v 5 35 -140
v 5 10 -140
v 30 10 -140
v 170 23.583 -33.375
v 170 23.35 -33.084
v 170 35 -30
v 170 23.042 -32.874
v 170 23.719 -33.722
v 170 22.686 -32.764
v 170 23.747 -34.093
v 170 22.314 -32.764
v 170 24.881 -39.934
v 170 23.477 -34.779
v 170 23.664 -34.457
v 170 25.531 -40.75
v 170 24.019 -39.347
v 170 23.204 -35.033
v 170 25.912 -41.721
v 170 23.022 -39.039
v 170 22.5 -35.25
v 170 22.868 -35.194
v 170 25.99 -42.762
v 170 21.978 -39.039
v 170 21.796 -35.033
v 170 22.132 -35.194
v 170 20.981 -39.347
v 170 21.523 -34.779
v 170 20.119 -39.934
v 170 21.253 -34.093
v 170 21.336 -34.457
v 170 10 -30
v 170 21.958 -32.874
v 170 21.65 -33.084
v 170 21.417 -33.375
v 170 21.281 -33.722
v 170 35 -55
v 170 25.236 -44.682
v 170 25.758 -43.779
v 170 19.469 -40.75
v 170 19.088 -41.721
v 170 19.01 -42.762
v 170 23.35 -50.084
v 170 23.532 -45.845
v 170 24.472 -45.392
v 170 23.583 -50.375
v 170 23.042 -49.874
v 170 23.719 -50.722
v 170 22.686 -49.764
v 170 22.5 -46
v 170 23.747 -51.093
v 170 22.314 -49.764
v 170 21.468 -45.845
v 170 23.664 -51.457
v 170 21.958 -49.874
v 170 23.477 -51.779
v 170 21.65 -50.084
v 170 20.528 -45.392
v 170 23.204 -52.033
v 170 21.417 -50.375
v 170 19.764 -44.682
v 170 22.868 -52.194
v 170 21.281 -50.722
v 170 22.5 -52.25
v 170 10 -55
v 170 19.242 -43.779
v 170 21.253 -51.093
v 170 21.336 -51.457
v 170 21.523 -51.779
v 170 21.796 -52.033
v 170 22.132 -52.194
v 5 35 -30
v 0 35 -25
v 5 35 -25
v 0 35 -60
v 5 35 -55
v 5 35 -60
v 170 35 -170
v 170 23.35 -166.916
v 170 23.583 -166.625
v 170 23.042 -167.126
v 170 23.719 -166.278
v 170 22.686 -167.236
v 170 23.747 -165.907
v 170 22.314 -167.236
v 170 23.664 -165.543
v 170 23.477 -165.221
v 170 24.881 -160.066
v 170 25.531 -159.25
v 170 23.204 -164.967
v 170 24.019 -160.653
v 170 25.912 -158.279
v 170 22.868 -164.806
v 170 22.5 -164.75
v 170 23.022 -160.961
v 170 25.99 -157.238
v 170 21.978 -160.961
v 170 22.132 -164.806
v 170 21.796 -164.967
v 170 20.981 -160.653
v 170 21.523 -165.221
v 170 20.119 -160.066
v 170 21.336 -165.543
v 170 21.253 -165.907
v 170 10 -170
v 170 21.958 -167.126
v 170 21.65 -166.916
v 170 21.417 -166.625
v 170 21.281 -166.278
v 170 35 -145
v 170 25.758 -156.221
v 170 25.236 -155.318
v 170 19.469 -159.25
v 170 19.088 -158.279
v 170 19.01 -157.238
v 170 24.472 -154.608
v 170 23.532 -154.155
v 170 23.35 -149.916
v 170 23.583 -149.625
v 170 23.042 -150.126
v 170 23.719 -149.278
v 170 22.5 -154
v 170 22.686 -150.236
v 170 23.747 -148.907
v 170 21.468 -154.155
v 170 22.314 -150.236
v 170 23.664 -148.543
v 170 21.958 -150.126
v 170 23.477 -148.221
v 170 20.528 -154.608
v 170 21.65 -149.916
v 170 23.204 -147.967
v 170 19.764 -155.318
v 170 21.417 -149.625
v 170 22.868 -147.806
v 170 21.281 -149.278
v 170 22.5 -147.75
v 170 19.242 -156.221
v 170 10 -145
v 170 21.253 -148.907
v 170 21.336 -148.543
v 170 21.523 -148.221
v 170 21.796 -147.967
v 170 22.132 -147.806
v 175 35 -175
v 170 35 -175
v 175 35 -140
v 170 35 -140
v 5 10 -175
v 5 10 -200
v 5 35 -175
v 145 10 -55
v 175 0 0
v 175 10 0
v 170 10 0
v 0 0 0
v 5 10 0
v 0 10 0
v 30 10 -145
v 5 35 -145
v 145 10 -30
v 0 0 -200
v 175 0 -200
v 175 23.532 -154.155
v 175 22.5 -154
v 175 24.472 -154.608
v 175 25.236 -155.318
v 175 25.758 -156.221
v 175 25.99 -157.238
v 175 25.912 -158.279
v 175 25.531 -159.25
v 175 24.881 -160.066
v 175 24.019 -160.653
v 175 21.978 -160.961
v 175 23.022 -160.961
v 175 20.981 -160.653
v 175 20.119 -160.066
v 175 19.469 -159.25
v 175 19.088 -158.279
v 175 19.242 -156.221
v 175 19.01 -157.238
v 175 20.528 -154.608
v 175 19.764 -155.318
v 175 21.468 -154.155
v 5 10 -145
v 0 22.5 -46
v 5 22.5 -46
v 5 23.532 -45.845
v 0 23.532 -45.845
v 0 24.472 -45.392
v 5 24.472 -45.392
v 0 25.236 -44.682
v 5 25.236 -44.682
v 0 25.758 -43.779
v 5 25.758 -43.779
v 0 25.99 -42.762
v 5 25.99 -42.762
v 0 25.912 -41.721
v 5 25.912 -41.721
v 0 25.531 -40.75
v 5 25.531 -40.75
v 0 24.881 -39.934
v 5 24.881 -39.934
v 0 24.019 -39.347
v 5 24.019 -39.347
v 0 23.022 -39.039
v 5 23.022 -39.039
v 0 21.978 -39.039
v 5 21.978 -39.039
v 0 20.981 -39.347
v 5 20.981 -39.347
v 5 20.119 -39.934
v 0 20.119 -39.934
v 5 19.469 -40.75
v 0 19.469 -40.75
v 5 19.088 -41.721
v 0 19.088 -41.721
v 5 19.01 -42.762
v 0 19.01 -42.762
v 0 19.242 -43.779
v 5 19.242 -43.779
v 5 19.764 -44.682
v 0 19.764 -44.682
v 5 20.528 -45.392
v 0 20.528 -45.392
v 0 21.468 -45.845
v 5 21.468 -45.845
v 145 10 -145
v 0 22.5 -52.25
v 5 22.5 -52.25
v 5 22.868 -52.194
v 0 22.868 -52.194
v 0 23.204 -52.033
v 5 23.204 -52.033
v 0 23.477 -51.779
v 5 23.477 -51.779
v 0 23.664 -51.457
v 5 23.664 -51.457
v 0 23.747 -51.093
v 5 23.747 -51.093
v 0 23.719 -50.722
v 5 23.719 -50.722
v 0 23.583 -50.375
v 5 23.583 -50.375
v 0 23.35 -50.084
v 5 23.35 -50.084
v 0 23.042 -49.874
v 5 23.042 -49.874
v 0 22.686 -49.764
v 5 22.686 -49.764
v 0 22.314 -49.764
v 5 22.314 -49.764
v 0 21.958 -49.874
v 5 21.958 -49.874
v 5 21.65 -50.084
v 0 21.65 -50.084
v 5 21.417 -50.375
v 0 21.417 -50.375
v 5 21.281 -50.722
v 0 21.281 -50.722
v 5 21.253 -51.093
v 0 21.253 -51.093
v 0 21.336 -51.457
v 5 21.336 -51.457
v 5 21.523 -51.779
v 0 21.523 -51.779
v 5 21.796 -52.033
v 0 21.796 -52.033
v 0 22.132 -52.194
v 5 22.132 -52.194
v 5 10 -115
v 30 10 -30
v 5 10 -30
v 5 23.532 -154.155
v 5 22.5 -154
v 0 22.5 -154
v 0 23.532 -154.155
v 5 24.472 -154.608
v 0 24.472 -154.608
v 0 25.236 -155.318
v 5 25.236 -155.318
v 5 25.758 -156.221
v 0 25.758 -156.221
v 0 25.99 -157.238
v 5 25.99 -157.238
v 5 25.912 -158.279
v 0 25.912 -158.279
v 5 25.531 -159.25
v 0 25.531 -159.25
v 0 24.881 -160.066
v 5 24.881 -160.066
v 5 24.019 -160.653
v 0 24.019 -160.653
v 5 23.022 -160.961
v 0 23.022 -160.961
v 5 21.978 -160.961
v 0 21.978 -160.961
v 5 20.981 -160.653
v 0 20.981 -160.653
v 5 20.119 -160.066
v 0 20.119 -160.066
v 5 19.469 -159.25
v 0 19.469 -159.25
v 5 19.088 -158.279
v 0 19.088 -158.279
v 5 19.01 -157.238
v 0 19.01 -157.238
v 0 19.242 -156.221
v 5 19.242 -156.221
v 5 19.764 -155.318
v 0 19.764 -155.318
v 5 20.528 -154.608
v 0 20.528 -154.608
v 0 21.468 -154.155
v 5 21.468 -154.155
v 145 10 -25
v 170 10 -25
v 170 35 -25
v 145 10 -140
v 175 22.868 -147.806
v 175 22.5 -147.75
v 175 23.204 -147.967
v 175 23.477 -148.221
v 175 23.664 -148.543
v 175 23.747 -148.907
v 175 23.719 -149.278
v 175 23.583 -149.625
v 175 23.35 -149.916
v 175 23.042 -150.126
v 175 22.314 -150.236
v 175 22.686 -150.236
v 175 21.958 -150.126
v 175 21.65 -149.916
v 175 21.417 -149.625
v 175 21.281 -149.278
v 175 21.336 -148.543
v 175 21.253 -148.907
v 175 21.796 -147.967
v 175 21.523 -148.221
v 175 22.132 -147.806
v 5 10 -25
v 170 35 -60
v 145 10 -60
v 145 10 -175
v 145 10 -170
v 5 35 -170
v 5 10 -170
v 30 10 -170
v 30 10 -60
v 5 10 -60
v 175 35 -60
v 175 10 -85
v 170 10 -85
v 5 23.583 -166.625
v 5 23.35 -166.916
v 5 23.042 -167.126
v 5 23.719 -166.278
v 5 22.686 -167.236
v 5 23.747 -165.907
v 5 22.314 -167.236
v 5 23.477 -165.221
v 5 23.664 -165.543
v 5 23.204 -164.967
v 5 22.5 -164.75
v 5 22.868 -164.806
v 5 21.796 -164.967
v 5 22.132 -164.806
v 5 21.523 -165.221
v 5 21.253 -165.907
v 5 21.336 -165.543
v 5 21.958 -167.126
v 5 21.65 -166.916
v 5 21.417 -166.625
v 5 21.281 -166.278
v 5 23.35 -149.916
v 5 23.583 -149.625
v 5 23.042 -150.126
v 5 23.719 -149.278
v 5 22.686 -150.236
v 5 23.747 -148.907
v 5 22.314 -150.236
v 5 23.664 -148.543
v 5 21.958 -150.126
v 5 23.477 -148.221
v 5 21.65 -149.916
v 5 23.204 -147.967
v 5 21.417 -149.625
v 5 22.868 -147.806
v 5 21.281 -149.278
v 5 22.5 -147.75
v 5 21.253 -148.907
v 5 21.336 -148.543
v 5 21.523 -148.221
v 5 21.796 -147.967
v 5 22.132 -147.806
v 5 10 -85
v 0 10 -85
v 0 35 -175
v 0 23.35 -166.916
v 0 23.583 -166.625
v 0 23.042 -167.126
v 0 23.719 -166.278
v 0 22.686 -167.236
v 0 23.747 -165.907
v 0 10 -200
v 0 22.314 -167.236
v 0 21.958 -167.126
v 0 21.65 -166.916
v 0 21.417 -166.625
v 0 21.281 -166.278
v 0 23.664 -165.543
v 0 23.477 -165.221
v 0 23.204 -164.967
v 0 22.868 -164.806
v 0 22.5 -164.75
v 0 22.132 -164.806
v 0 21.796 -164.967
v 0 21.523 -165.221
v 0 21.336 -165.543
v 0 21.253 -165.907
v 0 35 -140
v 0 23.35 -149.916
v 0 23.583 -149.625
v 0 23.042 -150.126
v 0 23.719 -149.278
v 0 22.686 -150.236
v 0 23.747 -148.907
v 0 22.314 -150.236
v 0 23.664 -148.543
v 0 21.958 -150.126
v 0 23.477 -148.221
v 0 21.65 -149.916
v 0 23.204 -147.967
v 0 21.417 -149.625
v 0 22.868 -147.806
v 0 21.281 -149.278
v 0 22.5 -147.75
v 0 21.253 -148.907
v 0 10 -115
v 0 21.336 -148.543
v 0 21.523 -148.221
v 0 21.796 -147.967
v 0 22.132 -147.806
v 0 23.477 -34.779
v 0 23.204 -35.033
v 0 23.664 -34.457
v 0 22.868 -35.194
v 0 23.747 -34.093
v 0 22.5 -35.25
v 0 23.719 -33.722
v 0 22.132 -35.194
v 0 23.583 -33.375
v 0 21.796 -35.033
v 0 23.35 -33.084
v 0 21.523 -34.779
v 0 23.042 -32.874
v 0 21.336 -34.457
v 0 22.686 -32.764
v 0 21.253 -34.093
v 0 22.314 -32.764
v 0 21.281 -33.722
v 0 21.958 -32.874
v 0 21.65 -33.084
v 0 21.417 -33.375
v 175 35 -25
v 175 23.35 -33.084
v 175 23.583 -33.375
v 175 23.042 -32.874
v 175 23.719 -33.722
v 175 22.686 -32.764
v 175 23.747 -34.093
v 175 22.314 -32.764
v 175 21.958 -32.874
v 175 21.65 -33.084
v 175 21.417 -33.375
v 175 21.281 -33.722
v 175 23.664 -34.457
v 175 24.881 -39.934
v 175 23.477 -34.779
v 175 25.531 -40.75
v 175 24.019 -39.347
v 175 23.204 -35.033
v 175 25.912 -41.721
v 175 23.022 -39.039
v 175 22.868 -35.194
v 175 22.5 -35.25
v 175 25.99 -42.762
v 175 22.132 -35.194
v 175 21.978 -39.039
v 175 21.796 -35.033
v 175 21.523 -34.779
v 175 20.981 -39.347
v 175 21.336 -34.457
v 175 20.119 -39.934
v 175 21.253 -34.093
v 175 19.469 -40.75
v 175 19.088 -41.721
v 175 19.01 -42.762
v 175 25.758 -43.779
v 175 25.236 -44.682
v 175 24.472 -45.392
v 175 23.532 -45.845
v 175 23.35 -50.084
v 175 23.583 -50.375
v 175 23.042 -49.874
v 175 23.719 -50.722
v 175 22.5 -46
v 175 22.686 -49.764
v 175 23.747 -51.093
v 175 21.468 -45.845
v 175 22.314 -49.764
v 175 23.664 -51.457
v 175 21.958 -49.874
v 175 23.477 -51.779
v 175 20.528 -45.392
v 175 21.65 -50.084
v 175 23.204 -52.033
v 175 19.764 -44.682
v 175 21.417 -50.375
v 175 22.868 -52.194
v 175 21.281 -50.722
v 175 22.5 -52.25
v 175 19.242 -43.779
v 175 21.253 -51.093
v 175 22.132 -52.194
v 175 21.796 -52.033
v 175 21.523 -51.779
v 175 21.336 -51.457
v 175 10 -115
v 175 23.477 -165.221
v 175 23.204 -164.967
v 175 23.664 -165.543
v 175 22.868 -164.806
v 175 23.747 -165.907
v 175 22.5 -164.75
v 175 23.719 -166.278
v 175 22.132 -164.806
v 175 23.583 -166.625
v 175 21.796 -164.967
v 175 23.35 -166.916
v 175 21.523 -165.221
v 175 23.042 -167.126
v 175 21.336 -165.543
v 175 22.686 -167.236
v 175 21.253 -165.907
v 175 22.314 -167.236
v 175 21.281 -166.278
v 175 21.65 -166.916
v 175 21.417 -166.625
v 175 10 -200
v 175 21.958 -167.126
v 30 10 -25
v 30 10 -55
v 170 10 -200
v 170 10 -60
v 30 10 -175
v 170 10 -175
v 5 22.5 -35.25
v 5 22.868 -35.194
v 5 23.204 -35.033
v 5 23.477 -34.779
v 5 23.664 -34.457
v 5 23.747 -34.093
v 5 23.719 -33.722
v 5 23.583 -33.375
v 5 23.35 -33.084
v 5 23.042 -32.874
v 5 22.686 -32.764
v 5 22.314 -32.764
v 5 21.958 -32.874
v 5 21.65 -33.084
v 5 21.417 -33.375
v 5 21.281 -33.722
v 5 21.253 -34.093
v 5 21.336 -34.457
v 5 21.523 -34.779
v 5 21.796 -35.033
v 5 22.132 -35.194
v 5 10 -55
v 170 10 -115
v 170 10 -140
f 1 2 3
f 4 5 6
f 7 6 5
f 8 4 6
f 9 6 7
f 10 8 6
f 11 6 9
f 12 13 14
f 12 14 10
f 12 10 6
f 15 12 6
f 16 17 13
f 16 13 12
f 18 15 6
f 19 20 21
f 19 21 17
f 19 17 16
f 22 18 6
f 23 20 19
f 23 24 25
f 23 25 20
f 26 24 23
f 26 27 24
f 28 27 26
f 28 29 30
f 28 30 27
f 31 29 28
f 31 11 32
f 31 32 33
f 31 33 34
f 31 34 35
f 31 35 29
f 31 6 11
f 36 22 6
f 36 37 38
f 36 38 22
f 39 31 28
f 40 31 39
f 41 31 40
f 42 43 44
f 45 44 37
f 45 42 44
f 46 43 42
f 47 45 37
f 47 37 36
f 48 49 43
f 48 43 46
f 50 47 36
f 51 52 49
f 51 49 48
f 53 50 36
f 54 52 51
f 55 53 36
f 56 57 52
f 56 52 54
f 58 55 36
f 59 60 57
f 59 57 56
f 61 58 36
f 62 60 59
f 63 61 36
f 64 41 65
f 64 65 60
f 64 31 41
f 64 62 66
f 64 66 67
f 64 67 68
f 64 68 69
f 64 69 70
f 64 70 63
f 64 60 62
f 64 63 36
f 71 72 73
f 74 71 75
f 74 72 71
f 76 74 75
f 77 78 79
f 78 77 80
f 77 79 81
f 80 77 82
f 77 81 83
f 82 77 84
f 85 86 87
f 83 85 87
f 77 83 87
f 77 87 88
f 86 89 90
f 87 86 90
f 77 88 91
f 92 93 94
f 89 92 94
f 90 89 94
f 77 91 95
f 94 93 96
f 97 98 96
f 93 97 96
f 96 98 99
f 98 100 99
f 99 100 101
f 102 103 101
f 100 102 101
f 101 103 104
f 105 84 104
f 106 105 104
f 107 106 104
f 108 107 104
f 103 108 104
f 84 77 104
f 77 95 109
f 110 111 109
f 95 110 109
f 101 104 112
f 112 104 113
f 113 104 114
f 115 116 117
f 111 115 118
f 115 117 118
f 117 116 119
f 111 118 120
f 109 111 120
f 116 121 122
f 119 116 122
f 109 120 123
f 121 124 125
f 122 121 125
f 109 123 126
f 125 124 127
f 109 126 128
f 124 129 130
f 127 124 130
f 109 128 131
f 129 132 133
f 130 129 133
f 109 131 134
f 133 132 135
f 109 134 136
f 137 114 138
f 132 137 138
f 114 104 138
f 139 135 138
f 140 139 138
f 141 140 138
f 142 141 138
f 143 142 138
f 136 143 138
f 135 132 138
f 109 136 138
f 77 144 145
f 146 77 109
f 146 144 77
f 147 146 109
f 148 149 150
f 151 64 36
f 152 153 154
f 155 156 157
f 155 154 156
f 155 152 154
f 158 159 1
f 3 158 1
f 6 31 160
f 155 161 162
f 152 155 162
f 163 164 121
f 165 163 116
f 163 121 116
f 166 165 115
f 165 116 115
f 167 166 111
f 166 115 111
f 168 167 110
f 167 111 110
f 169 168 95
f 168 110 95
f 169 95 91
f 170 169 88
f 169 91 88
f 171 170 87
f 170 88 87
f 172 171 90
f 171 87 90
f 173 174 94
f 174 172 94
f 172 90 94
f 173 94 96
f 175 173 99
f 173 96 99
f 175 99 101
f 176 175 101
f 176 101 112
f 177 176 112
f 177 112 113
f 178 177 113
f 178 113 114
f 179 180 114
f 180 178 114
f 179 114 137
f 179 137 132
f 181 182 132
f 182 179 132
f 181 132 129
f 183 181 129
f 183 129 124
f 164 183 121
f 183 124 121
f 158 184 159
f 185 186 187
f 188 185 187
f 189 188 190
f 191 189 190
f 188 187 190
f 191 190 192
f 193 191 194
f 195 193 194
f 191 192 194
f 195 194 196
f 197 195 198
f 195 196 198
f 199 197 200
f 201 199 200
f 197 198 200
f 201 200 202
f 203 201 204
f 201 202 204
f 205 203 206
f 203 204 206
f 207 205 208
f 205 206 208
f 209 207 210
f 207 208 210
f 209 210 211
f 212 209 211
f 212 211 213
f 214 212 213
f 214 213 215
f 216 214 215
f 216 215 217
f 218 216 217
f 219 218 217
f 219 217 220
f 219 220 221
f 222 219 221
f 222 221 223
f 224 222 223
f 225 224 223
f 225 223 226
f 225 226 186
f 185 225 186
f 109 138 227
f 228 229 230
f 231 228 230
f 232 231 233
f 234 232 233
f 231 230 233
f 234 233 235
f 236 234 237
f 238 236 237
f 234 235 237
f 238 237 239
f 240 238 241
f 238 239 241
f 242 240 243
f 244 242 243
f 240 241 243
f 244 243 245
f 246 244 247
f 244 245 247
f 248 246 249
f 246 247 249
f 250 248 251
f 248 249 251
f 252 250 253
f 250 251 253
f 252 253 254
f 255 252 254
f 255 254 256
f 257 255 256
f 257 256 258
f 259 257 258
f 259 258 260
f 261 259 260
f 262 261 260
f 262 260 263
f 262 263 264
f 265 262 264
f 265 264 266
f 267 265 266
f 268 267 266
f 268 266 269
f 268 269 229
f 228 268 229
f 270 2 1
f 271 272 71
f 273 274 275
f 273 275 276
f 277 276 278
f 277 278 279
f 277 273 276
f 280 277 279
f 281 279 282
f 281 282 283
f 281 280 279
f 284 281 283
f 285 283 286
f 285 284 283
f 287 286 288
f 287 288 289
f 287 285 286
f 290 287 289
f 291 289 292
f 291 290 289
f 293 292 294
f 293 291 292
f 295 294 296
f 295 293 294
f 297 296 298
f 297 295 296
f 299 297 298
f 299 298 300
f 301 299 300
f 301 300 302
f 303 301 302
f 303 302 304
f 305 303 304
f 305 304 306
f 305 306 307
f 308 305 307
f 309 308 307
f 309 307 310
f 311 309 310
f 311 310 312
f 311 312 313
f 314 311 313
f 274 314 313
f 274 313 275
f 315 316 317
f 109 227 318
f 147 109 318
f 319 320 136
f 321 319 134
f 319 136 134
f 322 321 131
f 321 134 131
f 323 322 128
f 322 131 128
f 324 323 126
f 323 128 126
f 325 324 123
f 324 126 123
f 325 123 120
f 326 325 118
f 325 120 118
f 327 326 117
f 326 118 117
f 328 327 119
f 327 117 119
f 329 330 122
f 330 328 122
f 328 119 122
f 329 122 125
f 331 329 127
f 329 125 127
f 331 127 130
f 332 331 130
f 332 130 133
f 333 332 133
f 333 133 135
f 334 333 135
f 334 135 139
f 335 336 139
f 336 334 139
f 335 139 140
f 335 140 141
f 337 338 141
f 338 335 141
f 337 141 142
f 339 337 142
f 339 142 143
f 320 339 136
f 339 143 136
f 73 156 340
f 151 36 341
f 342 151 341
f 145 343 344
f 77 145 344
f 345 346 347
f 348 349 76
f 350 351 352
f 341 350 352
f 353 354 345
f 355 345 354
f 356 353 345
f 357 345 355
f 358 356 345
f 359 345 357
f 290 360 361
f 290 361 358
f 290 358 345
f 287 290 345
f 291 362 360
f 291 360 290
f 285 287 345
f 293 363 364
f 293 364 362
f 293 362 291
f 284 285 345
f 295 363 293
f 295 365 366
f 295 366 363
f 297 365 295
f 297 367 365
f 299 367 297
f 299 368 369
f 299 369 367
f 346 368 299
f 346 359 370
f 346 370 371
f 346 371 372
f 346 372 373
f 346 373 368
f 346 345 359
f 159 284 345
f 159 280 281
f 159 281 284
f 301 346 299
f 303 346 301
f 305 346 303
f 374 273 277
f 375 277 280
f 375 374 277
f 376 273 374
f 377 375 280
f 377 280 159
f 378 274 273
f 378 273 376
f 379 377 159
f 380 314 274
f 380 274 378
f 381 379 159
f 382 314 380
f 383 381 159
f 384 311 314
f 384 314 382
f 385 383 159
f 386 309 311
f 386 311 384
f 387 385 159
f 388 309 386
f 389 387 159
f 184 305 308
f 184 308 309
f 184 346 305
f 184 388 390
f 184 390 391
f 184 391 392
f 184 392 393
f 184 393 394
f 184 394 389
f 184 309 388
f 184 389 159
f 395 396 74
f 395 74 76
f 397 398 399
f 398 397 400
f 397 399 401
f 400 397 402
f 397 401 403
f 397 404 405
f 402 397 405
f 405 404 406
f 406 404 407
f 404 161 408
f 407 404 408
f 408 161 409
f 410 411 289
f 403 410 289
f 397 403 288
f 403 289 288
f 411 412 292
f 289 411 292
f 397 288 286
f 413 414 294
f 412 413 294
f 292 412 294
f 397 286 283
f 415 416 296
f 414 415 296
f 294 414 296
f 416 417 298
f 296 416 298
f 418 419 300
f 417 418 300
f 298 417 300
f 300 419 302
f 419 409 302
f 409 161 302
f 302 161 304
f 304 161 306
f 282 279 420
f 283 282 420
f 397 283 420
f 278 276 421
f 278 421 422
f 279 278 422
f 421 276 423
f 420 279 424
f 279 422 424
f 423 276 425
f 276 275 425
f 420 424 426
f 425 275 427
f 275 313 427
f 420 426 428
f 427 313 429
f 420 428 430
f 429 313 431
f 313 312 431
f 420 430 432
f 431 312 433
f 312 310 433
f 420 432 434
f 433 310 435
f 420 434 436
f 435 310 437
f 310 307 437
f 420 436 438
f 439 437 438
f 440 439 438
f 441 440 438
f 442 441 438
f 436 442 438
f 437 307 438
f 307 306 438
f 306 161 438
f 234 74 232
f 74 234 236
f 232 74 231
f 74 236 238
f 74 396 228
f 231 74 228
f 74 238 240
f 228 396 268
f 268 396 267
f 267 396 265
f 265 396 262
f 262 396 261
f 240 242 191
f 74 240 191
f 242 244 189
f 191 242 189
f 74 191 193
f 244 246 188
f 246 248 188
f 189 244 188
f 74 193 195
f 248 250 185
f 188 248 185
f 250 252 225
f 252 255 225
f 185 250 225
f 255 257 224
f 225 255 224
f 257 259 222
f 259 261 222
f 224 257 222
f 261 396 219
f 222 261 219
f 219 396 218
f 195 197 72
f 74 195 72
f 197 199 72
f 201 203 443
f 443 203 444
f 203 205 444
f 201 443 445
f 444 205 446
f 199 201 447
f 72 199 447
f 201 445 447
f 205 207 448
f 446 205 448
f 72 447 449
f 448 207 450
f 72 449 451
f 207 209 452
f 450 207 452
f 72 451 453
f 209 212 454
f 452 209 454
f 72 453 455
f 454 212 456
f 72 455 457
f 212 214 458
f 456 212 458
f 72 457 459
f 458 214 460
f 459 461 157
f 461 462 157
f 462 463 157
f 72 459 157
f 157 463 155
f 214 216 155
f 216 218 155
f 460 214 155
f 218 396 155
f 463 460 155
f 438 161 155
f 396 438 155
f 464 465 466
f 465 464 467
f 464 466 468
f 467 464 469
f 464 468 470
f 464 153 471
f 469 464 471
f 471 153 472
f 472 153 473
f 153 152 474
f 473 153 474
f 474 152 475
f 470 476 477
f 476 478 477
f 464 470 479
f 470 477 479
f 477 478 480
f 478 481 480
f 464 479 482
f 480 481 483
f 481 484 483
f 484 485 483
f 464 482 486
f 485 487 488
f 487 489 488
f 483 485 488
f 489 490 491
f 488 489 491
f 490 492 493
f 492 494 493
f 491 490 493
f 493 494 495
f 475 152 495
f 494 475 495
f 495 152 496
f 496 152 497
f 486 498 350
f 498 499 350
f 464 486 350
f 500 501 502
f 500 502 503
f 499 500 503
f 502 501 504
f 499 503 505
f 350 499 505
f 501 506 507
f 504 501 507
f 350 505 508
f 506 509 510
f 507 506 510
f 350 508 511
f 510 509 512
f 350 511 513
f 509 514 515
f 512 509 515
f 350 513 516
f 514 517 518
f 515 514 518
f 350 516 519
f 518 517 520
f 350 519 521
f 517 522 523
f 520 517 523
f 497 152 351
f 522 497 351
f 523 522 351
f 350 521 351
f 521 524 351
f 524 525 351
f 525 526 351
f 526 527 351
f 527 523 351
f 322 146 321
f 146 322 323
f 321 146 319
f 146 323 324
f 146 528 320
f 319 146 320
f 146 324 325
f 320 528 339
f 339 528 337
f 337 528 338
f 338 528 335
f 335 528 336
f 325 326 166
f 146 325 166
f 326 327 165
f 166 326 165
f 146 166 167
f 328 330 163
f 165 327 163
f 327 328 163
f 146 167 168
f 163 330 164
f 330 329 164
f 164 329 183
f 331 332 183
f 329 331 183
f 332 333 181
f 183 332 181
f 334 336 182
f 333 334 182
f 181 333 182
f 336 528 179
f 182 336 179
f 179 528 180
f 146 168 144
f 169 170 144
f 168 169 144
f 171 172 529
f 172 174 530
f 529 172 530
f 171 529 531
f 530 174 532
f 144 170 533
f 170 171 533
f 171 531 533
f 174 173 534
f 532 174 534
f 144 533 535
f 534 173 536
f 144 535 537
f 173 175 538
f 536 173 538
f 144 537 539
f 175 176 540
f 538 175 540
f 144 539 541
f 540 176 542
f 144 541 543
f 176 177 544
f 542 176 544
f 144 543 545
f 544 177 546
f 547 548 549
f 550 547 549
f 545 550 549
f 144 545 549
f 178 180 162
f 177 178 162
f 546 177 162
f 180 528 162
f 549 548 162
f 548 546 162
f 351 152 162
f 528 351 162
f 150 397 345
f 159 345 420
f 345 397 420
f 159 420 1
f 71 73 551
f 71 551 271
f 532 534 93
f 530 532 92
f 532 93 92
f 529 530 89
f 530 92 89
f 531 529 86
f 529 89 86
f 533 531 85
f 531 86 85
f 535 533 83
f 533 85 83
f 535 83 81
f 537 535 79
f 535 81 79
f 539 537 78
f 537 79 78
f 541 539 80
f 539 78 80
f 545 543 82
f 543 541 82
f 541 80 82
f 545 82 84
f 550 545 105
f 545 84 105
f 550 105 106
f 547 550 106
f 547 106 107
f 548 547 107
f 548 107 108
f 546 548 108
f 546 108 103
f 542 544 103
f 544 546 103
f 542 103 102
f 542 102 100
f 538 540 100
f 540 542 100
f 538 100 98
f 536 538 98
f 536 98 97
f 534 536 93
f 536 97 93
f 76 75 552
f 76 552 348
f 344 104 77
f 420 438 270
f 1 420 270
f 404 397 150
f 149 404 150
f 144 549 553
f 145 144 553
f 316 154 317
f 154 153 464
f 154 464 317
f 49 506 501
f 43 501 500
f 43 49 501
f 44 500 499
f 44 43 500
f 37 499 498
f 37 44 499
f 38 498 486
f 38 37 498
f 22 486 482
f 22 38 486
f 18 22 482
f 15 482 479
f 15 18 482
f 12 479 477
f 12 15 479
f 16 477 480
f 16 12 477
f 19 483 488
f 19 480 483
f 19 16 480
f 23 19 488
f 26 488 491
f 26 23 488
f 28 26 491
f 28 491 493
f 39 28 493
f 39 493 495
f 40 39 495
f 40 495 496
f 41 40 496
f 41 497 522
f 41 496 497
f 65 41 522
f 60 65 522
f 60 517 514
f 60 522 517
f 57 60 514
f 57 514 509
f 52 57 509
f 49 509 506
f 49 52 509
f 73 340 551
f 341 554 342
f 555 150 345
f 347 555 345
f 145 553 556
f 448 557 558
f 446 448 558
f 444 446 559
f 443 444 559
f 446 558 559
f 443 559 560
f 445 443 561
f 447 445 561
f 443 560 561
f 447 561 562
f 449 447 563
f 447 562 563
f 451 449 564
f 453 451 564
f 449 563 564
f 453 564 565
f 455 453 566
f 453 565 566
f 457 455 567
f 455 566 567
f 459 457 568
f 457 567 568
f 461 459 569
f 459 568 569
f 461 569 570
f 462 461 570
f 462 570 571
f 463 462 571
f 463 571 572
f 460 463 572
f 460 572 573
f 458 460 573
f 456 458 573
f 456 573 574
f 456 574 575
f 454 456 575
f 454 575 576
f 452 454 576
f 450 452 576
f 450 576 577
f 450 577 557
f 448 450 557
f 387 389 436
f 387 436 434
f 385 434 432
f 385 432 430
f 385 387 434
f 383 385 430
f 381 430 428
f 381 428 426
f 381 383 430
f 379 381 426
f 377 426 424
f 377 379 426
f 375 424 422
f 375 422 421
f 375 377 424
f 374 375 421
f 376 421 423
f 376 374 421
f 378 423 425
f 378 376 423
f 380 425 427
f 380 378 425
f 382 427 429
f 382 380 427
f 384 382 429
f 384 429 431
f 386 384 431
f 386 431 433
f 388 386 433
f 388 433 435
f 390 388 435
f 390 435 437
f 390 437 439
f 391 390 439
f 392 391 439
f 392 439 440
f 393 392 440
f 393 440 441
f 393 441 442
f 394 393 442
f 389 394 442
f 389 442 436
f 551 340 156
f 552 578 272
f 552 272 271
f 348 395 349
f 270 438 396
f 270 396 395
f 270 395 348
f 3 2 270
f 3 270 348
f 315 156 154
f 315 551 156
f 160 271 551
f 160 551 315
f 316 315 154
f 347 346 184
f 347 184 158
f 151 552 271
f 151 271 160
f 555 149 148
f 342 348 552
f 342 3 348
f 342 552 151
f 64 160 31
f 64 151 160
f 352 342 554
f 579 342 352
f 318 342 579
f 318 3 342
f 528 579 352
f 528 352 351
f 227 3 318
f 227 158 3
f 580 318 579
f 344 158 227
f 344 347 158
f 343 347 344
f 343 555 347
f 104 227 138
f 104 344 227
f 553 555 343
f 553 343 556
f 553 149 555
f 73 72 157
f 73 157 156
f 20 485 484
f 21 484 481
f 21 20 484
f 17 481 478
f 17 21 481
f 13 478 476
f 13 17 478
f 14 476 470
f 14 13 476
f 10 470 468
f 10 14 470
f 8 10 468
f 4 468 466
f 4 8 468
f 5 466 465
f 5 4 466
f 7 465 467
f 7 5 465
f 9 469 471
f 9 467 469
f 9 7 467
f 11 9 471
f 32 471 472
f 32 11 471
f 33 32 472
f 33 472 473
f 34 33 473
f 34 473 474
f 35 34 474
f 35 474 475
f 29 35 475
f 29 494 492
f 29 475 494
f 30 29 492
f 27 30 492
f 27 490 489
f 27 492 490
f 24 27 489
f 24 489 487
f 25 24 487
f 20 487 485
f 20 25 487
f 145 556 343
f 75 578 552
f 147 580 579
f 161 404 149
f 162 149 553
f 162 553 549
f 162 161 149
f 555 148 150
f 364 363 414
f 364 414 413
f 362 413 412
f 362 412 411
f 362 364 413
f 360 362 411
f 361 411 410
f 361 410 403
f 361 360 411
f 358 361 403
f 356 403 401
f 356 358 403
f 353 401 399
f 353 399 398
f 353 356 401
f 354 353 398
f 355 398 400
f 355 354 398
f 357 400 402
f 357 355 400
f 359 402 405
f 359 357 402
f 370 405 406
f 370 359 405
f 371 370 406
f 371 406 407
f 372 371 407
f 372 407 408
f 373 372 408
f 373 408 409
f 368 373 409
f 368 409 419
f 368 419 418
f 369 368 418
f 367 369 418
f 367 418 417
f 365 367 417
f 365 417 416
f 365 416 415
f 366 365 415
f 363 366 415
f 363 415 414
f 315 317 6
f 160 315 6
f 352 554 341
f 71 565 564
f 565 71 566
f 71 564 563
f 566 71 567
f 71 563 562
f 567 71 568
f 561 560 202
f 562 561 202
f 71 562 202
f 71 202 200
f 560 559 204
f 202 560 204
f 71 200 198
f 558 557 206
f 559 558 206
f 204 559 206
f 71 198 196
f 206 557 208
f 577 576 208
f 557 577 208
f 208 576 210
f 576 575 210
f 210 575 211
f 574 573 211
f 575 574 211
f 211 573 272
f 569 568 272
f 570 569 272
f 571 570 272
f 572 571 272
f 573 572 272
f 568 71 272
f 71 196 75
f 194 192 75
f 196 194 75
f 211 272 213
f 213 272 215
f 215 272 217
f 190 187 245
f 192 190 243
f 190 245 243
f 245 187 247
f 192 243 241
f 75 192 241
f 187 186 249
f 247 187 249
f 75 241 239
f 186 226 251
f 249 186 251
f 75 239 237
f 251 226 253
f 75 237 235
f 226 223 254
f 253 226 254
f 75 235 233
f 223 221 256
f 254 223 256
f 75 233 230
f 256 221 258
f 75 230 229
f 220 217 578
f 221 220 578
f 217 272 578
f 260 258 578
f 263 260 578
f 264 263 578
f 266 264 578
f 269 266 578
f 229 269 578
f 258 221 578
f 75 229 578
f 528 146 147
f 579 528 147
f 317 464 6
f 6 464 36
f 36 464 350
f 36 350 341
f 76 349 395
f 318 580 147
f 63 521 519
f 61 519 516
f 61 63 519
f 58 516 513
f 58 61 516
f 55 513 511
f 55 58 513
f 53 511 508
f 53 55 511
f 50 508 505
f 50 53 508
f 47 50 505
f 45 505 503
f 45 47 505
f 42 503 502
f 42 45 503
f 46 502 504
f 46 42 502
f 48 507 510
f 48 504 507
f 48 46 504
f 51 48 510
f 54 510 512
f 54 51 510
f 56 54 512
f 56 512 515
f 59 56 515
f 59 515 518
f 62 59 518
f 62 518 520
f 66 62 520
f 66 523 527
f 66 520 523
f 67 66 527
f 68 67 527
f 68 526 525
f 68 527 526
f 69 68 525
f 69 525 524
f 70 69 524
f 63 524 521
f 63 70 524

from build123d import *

# Parameters (mm, degrees)
SKETCH1_W                = 175
SKETCH1_H                = 200
BOSS_EXTRUDE1_DEPTH      = 10
SKETCH3_W                = 5
SKETCH3_H                = 25
SKETCH3_W_2              = 25
SKETCH3_H_2              = 5
BOSS_EXTRUDE2_DEPTH      = 25
CHAMFER1_SIZE            = 25
SKETCH4_R                = 3.5
SKETCH4_R_2              = 1.25
CUT_EXTRUDE1_DEPTH       = 25
CHAMFER1_OF_MIRROR1_SIZE = 25


# Read off the part's stored shape, not the designer's step: Mirror2
with BuildPart() as part:
    # Sketch1 → Boss-Extrude1 (new body)
    with BuildSketch(Plane(origin=(0, 0, 0), x_dir=(1, 0, 0), z_dir=(0, 1, 0))):
        with Locations((87.5, 100)):
            Rectangle(SKETCH1_W, SKETCH1_H)
    extrude(amount=BOSS_EXTRUDE1_DEPTH)

    # Sketch3 → Boss-Extrude2 (add)
    with BuildSketch(Plane(origin=(0, 10, 0), x_dir=(1, 0, 0), z_dir=(0, 1, 0))):
        with Locations((2.5, 72.5)):
            Rectangle(SKETCH3_W, SKETCH3_H)
        Polygon((0, 60), (0, 25), (5, 25), (5, 30), (5, 55), (5, 60), align=None)
        with Locations((17.5, 57.5)):
            Rectangle(SKETCH3_W_2, SKETCH3_H_2)
        with Locations((17.5, 27.5)):
            Rectangle(SKETCH3_W_2, SKETCH3_H_2)
        with Locations((2.5, 12.5)):
            Rectangle(SKETCH3_W, SKETCH3_H)
    boss_extrude2 = extrude(amount=BOSS_EXTRUDE2_DEPTH)

    # Chamfer1
    chamfer1_edges = [part.edges().sort_by_distance(p)[0] for p in [
        (2.5, 35, -85),
        (30, 35, -57.5),
        (30, 35, -27.5),
        (2.5, 35, 0),
    ]]
    chamfer(chamfer1_edges, length=CHAMFER1_SIZE - 0.0001)  # a hair under: the kernel refuses the full size

    # Sketch4 → Cut-Extrude1 (cut)
    with BuildSketch(Plane(origin=(5, 0, 0), x_dir=(0, 0, -1), z_dir=(1, 0, 0))):
        with Locations((42.5, 22.5)):
            Circle(SKETCH4_R)
        with Locations((34, 22.5)):
            Circle(SKETCH4_R_2)
        with Locations((51, 22.5)):
            Circle(SKETCH4_R_2)
    cut_extrude1 = extrude(amount=-CUT_EXTRUDE1_DEPTH, mode=Mode.SUBTRACT)

    # Mirror1: Boss-Extrude2, Cut-Extrude1 across plane
    add(boss_extrude2.mirror(Plane(origin=(87.5, 0, 0), x_dir=(0, 0, 1), z_dir=(1, 0, 0))))
    add(cut_extrude1.mirror(Plane(origin=(87.5, 0, 0), x_dir=(0, 0, 1), z_dir=(1, 0, 0))), mode=Mode.SUBTRACT)

    # Chamfer1 of Mirror1
    chamfer1_of_mirror1_edges = [part.edges().sort_by_distance(p)[0] for p in [
        (172.5, 35, -85),
        (145, 35, -57.5),
        (145, 35, -27.5),
        (172.5, 35, 0),
    ]]
    chamfer(chamfer1_of_mirror1_edges, length=CHAMFER1_OF_MIRROR1_SIZE - 0.0001)  # a hair under: the kernel refuses the full size

    # Mirror2: part across plane


with BuildPart() as part_1:
    add(part.part)
    add(part.part.mirror(Plane.XY.offset(-100)))


solid = part_1.part
